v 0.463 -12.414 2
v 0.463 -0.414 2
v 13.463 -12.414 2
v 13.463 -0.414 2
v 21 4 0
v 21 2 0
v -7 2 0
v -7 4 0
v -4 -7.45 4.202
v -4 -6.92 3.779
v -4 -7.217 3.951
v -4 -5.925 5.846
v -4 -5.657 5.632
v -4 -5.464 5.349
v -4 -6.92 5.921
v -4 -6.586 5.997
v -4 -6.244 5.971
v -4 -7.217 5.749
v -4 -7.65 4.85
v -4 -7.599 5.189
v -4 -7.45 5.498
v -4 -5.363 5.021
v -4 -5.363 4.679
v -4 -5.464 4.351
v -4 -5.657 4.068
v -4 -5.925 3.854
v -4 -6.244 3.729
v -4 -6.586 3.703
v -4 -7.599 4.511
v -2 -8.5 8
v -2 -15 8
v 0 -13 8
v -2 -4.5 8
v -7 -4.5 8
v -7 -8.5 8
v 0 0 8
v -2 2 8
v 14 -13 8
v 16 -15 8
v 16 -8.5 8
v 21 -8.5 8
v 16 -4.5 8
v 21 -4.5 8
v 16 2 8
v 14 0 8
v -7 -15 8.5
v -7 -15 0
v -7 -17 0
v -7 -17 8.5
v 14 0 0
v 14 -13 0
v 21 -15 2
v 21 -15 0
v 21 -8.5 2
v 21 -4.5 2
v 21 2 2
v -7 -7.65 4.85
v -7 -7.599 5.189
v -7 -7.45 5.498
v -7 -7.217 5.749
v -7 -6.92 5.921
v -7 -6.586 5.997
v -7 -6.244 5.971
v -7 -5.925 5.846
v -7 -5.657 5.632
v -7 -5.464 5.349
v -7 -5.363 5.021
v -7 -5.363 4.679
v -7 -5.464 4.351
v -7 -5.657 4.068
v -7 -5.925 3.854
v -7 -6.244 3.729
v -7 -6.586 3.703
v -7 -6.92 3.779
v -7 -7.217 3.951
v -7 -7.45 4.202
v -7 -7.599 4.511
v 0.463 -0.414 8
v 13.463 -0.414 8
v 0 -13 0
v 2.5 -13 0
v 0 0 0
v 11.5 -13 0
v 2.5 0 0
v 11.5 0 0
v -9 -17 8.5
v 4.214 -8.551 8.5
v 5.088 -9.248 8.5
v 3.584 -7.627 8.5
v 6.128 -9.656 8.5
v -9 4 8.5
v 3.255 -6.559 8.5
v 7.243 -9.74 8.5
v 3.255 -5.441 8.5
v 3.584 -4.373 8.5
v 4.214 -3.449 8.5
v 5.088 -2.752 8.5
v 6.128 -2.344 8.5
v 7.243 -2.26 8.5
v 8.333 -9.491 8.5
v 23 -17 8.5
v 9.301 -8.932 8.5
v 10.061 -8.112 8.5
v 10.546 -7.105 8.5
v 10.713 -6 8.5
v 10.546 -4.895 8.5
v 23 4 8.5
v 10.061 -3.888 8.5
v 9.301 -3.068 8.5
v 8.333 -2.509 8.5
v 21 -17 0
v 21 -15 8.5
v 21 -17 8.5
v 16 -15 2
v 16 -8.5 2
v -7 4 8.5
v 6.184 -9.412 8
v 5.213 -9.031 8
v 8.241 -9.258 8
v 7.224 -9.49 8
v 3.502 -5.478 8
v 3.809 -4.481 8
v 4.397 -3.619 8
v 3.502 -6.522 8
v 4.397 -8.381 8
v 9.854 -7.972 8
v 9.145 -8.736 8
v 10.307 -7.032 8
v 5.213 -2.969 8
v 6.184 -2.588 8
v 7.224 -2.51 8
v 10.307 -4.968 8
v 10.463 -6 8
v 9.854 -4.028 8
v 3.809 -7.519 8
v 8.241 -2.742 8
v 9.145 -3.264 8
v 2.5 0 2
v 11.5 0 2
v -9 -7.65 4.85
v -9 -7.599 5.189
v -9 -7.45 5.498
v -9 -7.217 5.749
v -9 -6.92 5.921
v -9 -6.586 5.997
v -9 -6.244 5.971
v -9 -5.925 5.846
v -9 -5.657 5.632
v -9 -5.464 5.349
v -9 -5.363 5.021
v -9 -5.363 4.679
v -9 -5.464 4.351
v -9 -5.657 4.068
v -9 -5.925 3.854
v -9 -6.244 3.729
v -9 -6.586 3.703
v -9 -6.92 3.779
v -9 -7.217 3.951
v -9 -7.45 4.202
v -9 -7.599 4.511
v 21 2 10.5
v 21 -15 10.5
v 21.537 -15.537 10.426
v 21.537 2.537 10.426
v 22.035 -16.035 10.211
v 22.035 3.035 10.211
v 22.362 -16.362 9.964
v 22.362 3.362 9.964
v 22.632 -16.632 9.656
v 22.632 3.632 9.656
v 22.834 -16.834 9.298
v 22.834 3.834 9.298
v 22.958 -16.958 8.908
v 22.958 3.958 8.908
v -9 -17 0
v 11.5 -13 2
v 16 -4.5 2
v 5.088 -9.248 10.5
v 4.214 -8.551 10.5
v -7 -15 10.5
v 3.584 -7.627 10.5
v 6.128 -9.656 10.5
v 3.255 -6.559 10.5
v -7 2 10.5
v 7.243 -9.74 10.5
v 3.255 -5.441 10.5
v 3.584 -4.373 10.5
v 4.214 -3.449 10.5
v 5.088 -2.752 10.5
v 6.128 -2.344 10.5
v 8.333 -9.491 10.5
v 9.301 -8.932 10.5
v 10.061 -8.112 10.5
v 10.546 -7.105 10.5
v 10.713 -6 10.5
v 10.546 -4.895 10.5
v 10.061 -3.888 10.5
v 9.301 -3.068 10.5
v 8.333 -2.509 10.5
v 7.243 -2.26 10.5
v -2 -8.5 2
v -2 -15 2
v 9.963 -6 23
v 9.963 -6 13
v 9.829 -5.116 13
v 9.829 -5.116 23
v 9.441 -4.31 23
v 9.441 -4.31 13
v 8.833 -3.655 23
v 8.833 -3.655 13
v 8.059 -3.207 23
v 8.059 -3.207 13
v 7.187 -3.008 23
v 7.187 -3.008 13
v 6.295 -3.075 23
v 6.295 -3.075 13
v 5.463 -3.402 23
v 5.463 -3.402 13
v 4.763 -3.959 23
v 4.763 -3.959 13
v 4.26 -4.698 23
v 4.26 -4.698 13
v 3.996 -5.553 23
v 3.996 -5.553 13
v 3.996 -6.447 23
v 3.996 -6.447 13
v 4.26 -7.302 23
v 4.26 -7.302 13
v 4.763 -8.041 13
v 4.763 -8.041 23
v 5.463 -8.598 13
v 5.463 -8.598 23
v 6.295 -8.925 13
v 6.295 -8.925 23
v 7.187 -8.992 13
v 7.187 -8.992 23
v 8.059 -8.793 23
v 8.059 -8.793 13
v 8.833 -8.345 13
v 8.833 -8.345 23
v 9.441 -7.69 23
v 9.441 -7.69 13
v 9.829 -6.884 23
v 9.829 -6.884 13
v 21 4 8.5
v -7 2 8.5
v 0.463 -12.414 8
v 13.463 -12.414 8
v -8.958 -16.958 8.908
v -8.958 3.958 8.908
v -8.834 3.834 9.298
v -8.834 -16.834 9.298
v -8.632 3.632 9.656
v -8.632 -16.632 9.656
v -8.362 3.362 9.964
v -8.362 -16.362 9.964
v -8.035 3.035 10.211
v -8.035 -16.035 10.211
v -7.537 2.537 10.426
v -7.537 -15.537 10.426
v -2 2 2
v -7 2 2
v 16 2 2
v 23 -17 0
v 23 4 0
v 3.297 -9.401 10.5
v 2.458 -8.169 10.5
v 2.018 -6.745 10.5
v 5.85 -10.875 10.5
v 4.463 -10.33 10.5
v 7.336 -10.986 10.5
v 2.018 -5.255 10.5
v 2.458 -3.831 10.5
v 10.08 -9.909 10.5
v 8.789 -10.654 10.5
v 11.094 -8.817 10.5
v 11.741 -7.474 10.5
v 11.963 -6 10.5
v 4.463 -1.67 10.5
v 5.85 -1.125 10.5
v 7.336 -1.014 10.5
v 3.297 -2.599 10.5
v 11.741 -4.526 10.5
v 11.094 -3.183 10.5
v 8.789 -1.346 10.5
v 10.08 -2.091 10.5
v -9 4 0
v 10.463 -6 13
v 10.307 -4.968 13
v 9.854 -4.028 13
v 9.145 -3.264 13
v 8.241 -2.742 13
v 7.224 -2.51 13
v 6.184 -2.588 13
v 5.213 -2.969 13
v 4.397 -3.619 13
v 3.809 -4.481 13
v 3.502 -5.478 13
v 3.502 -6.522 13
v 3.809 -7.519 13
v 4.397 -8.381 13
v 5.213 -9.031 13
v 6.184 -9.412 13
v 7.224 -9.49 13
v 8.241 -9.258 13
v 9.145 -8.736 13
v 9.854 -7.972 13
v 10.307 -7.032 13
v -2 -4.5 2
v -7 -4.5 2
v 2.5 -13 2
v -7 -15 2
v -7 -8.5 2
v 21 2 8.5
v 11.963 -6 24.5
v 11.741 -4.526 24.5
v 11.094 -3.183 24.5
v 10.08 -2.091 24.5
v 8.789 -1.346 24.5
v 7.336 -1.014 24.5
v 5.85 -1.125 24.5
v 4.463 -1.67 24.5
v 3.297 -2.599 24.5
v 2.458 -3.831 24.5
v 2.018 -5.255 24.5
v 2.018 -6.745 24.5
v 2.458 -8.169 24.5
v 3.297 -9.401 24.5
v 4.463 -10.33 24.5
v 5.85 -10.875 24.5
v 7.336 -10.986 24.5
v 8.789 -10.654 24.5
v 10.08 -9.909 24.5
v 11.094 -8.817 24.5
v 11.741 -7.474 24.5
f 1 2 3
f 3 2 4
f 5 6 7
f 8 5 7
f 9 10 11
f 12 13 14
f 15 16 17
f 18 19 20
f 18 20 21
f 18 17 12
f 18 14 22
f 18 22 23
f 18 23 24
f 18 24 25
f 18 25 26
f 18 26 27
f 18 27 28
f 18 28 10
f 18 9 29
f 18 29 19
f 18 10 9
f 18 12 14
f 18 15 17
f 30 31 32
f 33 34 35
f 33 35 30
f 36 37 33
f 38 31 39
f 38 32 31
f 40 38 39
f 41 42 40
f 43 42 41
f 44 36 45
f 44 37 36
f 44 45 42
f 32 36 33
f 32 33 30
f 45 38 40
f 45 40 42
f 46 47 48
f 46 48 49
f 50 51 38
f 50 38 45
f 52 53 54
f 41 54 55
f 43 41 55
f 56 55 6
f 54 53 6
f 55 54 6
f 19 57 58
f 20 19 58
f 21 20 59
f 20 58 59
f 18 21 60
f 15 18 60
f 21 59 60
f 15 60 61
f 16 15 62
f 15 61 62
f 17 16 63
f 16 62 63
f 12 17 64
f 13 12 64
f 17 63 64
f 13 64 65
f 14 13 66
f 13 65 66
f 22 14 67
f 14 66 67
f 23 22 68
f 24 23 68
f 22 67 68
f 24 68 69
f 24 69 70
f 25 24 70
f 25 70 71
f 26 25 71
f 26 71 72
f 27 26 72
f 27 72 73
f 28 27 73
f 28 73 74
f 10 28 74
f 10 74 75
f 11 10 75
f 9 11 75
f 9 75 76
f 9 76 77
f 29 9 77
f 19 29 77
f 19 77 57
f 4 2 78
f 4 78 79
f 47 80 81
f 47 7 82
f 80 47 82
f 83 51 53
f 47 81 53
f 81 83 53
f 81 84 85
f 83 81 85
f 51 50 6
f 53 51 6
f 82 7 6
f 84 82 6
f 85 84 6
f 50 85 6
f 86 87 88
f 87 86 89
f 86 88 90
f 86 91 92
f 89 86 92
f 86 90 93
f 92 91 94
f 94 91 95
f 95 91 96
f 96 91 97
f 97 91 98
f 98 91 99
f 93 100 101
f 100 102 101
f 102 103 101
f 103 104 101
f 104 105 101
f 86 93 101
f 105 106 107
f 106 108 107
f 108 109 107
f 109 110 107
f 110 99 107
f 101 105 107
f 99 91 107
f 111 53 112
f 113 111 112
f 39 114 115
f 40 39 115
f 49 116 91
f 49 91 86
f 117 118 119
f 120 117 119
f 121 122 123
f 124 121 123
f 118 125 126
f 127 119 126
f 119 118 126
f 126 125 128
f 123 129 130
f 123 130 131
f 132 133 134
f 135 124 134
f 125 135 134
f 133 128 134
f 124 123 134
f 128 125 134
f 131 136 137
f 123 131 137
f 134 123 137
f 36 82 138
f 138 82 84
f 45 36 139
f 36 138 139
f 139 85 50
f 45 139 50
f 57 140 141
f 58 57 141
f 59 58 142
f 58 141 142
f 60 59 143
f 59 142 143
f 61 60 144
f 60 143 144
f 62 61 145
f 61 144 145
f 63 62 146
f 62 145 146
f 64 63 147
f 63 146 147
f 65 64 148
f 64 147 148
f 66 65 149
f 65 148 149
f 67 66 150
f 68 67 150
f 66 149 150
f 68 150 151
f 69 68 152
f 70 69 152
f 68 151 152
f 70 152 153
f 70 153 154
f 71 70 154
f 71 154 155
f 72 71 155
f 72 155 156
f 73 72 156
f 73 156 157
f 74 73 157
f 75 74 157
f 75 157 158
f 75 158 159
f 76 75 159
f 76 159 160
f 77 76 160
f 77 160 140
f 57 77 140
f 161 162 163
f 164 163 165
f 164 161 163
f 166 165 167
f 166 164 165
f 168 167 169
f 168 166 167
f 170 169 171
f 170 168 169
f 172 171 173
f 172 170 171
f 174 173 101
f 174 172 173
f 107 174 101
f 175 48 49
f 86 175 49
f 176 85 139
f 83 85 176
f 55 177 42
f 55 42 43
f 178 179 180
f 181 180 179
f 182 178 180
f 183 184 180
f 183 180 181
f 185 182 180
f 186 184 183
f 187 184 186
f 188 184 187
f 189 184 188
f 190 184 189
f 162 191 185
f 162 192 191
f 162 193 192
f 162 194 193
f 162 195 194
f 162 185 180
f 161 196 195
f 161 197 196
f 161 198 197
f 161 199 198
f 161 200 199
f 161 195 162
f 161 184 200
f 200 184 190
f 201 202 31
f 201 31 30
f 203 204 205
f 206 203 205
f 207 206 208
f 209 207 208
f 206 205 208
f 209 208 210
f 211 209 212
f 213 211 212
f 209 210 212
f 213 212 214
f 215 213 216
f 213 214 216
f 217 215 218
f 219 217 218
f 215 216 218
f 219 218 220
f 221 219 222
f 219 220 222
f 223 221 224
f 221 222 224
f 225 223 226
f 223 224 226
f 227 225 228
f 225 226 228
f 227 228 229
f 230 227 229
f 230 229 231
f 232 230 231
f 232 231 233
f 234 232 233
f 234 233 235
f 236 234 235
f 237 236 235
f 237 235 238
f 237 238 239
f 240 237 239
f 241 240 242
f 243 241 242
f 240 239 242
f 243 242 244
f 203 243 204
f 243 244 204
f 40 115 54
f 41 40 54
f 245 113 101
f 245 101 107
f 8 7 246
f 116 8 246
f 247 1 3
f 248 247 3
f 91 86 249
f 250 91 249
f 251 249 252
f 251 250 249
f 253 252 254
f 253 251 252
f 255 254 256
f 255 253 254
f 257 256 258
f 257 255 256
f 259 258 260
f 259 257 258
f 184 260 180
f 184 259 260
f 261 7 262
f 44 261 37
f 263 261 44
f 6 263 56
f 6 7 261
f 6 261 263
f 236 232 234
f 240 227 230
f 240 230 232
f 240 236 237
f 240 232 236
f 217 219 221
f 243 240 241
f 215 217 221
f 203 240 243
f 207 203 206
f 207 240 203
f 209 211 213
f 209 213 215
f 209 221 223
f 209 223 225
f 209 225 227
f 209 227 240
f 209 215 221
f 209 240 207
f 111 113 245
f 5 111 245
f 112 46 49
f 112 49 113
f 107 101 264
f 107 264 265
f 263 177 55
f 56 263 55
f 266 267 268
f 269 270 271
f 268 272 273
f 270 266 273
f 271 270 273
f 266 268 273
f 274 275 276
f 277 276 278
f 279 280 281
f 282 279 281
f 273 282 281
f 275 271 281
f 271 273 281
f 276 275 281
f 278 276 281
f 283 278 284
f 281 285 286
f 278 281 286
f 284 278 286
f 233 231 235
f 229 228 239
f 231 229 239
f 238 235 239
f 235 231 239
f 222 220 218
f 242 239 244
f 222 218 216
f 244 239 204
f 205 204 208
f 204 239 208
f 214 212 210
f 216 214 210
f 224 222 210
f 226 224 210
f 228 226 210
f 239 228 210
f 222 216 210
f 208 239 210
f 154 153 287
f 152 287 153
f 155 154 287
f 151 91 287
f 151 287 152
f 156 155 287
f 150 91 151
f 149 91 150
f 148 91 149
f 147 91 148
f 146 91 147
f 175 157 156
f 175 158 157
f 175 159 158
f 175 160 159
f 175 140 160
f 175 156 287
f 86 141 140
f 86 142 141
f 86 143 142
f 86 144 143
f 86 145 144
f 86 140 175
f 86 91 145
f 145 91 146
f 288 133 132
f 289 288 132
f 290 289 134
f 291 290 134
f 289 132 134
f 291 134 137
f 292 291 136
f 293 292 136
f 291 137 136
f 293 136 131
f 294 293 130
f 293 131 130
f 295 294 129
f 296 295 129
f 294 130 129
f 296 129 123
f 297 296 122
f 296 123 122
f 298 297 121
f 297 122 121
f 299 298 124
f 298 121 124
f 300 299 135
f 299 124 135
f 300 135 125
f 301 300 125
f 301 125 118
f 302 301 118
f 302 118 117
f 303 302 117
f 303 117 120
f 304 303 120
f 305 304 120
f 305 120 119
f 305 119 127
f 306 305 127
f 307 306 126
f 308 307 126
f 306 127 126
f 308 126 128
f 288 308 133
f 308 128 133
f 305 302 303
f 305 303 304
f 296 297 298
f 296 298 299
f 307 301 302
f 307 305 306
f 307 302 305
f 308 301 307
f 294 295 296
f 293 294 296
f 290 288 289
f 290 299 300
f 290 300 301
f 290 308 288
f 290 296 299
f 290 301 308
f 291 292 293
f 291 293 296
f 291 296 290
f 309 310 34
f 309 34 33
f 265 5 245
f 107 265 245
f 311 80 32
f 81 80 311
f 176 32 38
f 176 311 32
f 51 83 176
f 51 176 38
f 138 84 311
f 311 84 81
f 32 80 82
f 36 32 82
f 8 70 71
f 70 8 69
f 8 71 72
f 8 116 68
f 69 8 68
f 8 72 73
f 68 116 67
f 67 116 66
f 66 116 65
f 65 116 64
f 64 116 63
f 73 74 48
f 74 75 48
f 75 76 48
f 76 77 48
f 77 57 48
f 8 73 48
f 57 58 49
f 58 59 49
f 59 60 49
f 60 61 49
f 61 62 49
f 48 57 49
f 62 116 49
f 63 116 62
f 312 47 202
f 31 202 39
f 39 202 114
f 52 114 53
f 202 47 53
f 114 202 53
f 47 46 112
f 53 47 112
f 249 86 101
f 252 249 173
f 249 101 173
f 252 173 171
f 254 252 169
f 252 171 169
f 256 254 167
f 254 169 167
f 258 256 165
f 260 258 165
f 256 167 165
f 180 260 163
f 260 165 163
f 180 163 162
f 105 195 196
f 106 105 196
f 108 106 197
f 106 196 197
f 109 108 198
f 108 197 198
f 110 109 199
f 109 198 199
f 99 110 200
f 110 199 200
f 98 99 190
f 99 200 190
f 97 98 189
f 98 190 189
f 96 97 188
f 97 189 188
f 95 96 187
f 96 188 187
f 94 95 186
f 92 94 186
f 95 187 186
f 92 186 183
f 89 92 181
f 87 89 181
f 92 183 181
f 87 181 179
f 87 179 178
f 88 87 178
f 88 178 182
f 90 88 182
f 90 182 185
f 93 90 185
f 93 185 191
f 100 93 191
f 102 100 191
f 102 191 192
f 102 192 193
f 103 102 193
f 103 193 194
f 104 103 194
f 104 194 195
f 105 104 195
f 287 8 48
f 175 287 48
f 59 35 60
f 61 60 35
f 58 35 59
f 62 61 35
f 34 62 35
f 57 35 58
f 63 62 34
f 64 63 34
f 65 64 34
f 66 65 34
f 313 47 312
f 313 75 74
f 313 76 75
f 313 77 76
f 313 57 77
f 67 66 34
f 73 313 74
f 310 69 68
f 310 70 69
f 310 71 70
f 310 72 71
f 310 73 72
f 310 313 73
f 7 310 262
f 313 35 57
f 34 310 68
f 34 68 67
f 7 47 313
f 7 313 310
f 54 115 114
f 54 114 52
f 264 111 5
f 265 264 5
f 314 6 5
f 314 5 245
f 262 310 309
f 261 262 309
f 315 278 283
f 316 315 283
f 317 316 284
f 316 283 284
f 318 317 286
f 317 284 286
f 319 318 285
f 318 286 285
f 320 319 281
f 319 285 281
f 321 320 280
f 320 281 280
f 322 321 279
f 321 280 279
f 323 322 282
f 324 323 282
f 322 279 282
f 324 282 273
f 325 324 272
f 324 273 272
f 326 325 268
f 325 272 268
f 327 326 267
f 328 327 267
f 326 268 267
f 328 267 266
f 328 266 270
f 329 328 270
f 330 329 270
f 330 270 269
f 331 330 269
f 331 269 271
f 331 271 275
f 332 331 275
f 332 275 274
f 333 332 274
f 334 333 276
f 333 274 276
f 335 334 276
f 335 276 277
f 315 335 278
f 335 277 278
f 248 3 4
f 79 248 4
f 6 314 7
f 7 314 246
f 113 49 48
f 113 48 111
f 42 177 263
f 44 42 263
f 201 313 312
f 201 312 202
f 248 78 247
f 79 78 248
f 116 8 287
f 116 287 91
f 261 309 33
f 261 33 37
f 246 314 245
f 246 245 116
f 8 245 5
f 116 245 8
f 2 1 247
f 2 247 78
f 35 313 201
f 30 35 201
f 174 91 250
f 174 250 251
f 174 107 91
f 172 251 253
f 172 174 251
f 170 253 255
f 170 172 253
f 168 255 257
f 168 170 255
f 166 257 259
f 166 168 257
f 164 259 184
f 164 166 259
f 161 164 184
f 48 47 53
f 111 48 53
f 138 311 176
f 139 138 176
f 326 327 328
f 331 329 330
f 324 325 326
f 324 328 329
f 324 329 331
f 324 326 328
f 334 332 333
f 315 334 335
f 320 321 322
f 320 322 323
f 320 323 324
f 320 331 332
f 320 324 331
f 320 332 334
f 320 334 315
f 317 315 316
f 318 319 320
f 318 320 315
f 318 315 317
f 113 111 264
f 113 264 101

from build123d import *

# Parameters (mm, degrees)
F0_W      = 18
F0_H      = 17
F0_W_2    = 14
F0_H_2    = 13
F1_DEPTH  = 8
F2_W      = 9
F2_H      = 13
F3_DEPTH  = 2
F5_W      = 13
F5_H      = 12
F6_DEPTH  = 6
F7_R      = 3.5
F8_DEPTH  = 5
F9_R      = 3
F10_DEPTH = 10
F11_W     = 5
F11_H     = 17
F12_DEPTH = 2
F13_W     = 5
F13_H     = 4
F14_DEPTH = 6
F15_W     = 28
F15_H     = 8.5
F16_DEPTH = 2
F17_W     = 21
F17_H     = 8.5
F18_DEPTH = 2
F19_W     = 28
F19_H     = 8.5
F20_DEPTH = 2
F21_W     = 21
F21_H     = 8.5
F22_DEPTH = 2
F23_R     = 1.15
F24_DEPTH = 5
F25_W     = 32
F25_H     = 21
F26_DEPTH = 2
F27_R     = 3.75
F28_DEPTH = 5
F29_R     = 5
F30_DEPTH = 14
F31_R     = 1.99999


# Not quite as in the source:
# - a fillet or chamfer is up to 0.001 mm smaller than in the source, because OpenCascade refuses the exact size


with BuildPart() as f1:
    # F0 (on Top) → F1 (new body)
    with BuildSketch(Plane.XY):
        with Locations((7, -6.5)):
            Rectangle(F0_W, F0_H)
        with Locations((7, -6.5)):
            Rectangle(F0_W_2, F0_H_2, mode=Mode.SUBTRACT)
    extrude(amount=F1_DEPTH)

    # F2 (on face) → F3 (join)
    with BuildSketch(Plane(origin=(0, 0, 0), x_dir=(1, 0, 0), z_dir=(0, 0, -1))):
        with Locations((7, 6.5)):
            Rectangle(F2_W, F2_H)
    extrude(amount=-F3_DEPTH)

    # F11 (on Top) → F12 (join)
    with BuildSketch(Plane.XY):
        with Locations((-4.5, -6.5)):
            Rectangle(F11_W, F11_H)
        with Locations((18.5, -6.5)):
            Rectangle(F11_W, F11_H)
    extrude(amount=F12_DEPTH)

    # F13 (on face) → F14 (join)
    with BuildSketch(Plane.XY.offset(2)):
        with Locations((-4.5, -6.5)):
            Rectangle(F13_W, F13_H)
        with Locations((18.5, -6.5)):
            Rectangle(F13_W, F13_H)
    extrude(amount=F14_DEPTH)


with BuildPart() as f6:
    # F5 (on face) → F6 (new body)
    with BuildSketch(Plane.XY.offset(2)):
        with Locations((6.9626439363, -6.4136818983)):
            Rectangle(F5_W, F5_H)
    extrude(amount=F6_DEPTH)


with BuildPart() as f8:
    # F7 (on face) → F8 (new body)
    with BuildSketch(Plane.XY.offset(8)):
        with Locations((6.9626439363, -6)):
            Circle(F7_R)
    extrude(amount=F8_DEPTH)


with BuildPart() as f10:
    # F9 (on face) → F10 (new body)
    with BuildSketch(Plane.XY.offset(13)):
        with Locations((6.9626439363, -6)):
            Circle(F9_R)
    extrude(amount=F10_DEPTH)


with BuildPart() as f16:
    # F15 (on face) → F16 (new body)
    with BuildSketch(Plane.XZ.offset(15)):
        with Locations((7, 4.25)):
            Rectangle(F15_W, F15_H)
    extrude(amount=F16_DEPTH)


with BuildPart() as f18:
    # F17 (on face) → F18 (new body)
    with BuildSketch(Plane.YZ.offset(21)):
        with Locations((-6.5, 4.25)):
            Rectangle(F17_W, F17_H)
    extrude(amount=F18_DEPTH)


with BuildPart() as f20:
    # F19 (on face) → F20 (new body)
    with BuildSketch(Plane(origin=(0, 2, 0), x_dir=(-1, 0, 0), z_dir=(0, 1, 0))):
        with Locations((-7, 4.25)):
            Rectangle(F19_W, F19_H)
    extrude(amount=F20_DEPTH)


with BuildPart() as f22:
    # F21 (on face) → F22 (new body)
    with BuildSketch(Plane(origin=(-7, 0, 0), x_dir=(0, -1, 0), z_dir=(-1, 0, 0))):
        with Locations((6.5, 4.25)):
            Rectangle(F21_W, F21_H)
    extrude(amount=F22_DEPTH)


with BuildPart() as f24_tool:
    # F23 (on face) → F24 (new body)
    with BuildSketch(Plane(origin=(-9, 0, 0), x_dir=(0, -1, 0), z_dir=(-1, 0, 0))):
        with Locations((6.5, 4.85)):
            Circle(F23_R)
    extrude(amount=-F24_DEPTH)


with BuildPart() as f1_1:
    add(f1.part)

    # F24: cut by f24_tool
    add(f24_tool.part, mode=Mode.SUBTRACT)


with BuildPart() as f22_1:
    add(f22.part)

    # F24: cut by f24_tool
    add(f24_tool.part, mode=Mode.SUBTRACT)


with BuildPart() as f26:
    # F25 (on face) → F26 (new body)
    with BuildSketch(Plane.XY.offset(8.5)):
        with Locations((7, -6.5)):
            Rectangle(F25_W, F25_H)
    extrude(amount=F26_DEPTH)

    # F27 (on face) → F28 (cut)
    with BuildSketch(Plane.XY.offset(13)):
        with Locations((6.9626439363, -6)):
            Circle(F27_R)
    extrude(amount=-F28_DEPTH, mode=Mode.SUBTRACT)

    # F31 (radius 2 in the source; OpenCascade refuses exactly that, so slightly less here)
    f31_edges = [f26.edges().sort_by_distance(p)[0] for p in [
        (-9, -6.5, 10.5),
        (7, 4, 10.5),
        (7, -17, 10.5),
        (23, -6.5, 10.5),
    ]]
    fillet(f31_edges, radius=F31_R)


with BuildPart() as f30:
    # F29 (on face) → F30 (new body)
    with BuildSketch(Plane.XY.offset(10.5)):
        with Locations((6.9626439363, -6)):
            Circle(F29_R)
    extrude(amount=F30_DEPTH)


solid = Compound([f6.part, f8.part, f10.part, f16.part, f18.part, f20.part, f1_1.part, f22_1.part, f26.part, f30.part])
